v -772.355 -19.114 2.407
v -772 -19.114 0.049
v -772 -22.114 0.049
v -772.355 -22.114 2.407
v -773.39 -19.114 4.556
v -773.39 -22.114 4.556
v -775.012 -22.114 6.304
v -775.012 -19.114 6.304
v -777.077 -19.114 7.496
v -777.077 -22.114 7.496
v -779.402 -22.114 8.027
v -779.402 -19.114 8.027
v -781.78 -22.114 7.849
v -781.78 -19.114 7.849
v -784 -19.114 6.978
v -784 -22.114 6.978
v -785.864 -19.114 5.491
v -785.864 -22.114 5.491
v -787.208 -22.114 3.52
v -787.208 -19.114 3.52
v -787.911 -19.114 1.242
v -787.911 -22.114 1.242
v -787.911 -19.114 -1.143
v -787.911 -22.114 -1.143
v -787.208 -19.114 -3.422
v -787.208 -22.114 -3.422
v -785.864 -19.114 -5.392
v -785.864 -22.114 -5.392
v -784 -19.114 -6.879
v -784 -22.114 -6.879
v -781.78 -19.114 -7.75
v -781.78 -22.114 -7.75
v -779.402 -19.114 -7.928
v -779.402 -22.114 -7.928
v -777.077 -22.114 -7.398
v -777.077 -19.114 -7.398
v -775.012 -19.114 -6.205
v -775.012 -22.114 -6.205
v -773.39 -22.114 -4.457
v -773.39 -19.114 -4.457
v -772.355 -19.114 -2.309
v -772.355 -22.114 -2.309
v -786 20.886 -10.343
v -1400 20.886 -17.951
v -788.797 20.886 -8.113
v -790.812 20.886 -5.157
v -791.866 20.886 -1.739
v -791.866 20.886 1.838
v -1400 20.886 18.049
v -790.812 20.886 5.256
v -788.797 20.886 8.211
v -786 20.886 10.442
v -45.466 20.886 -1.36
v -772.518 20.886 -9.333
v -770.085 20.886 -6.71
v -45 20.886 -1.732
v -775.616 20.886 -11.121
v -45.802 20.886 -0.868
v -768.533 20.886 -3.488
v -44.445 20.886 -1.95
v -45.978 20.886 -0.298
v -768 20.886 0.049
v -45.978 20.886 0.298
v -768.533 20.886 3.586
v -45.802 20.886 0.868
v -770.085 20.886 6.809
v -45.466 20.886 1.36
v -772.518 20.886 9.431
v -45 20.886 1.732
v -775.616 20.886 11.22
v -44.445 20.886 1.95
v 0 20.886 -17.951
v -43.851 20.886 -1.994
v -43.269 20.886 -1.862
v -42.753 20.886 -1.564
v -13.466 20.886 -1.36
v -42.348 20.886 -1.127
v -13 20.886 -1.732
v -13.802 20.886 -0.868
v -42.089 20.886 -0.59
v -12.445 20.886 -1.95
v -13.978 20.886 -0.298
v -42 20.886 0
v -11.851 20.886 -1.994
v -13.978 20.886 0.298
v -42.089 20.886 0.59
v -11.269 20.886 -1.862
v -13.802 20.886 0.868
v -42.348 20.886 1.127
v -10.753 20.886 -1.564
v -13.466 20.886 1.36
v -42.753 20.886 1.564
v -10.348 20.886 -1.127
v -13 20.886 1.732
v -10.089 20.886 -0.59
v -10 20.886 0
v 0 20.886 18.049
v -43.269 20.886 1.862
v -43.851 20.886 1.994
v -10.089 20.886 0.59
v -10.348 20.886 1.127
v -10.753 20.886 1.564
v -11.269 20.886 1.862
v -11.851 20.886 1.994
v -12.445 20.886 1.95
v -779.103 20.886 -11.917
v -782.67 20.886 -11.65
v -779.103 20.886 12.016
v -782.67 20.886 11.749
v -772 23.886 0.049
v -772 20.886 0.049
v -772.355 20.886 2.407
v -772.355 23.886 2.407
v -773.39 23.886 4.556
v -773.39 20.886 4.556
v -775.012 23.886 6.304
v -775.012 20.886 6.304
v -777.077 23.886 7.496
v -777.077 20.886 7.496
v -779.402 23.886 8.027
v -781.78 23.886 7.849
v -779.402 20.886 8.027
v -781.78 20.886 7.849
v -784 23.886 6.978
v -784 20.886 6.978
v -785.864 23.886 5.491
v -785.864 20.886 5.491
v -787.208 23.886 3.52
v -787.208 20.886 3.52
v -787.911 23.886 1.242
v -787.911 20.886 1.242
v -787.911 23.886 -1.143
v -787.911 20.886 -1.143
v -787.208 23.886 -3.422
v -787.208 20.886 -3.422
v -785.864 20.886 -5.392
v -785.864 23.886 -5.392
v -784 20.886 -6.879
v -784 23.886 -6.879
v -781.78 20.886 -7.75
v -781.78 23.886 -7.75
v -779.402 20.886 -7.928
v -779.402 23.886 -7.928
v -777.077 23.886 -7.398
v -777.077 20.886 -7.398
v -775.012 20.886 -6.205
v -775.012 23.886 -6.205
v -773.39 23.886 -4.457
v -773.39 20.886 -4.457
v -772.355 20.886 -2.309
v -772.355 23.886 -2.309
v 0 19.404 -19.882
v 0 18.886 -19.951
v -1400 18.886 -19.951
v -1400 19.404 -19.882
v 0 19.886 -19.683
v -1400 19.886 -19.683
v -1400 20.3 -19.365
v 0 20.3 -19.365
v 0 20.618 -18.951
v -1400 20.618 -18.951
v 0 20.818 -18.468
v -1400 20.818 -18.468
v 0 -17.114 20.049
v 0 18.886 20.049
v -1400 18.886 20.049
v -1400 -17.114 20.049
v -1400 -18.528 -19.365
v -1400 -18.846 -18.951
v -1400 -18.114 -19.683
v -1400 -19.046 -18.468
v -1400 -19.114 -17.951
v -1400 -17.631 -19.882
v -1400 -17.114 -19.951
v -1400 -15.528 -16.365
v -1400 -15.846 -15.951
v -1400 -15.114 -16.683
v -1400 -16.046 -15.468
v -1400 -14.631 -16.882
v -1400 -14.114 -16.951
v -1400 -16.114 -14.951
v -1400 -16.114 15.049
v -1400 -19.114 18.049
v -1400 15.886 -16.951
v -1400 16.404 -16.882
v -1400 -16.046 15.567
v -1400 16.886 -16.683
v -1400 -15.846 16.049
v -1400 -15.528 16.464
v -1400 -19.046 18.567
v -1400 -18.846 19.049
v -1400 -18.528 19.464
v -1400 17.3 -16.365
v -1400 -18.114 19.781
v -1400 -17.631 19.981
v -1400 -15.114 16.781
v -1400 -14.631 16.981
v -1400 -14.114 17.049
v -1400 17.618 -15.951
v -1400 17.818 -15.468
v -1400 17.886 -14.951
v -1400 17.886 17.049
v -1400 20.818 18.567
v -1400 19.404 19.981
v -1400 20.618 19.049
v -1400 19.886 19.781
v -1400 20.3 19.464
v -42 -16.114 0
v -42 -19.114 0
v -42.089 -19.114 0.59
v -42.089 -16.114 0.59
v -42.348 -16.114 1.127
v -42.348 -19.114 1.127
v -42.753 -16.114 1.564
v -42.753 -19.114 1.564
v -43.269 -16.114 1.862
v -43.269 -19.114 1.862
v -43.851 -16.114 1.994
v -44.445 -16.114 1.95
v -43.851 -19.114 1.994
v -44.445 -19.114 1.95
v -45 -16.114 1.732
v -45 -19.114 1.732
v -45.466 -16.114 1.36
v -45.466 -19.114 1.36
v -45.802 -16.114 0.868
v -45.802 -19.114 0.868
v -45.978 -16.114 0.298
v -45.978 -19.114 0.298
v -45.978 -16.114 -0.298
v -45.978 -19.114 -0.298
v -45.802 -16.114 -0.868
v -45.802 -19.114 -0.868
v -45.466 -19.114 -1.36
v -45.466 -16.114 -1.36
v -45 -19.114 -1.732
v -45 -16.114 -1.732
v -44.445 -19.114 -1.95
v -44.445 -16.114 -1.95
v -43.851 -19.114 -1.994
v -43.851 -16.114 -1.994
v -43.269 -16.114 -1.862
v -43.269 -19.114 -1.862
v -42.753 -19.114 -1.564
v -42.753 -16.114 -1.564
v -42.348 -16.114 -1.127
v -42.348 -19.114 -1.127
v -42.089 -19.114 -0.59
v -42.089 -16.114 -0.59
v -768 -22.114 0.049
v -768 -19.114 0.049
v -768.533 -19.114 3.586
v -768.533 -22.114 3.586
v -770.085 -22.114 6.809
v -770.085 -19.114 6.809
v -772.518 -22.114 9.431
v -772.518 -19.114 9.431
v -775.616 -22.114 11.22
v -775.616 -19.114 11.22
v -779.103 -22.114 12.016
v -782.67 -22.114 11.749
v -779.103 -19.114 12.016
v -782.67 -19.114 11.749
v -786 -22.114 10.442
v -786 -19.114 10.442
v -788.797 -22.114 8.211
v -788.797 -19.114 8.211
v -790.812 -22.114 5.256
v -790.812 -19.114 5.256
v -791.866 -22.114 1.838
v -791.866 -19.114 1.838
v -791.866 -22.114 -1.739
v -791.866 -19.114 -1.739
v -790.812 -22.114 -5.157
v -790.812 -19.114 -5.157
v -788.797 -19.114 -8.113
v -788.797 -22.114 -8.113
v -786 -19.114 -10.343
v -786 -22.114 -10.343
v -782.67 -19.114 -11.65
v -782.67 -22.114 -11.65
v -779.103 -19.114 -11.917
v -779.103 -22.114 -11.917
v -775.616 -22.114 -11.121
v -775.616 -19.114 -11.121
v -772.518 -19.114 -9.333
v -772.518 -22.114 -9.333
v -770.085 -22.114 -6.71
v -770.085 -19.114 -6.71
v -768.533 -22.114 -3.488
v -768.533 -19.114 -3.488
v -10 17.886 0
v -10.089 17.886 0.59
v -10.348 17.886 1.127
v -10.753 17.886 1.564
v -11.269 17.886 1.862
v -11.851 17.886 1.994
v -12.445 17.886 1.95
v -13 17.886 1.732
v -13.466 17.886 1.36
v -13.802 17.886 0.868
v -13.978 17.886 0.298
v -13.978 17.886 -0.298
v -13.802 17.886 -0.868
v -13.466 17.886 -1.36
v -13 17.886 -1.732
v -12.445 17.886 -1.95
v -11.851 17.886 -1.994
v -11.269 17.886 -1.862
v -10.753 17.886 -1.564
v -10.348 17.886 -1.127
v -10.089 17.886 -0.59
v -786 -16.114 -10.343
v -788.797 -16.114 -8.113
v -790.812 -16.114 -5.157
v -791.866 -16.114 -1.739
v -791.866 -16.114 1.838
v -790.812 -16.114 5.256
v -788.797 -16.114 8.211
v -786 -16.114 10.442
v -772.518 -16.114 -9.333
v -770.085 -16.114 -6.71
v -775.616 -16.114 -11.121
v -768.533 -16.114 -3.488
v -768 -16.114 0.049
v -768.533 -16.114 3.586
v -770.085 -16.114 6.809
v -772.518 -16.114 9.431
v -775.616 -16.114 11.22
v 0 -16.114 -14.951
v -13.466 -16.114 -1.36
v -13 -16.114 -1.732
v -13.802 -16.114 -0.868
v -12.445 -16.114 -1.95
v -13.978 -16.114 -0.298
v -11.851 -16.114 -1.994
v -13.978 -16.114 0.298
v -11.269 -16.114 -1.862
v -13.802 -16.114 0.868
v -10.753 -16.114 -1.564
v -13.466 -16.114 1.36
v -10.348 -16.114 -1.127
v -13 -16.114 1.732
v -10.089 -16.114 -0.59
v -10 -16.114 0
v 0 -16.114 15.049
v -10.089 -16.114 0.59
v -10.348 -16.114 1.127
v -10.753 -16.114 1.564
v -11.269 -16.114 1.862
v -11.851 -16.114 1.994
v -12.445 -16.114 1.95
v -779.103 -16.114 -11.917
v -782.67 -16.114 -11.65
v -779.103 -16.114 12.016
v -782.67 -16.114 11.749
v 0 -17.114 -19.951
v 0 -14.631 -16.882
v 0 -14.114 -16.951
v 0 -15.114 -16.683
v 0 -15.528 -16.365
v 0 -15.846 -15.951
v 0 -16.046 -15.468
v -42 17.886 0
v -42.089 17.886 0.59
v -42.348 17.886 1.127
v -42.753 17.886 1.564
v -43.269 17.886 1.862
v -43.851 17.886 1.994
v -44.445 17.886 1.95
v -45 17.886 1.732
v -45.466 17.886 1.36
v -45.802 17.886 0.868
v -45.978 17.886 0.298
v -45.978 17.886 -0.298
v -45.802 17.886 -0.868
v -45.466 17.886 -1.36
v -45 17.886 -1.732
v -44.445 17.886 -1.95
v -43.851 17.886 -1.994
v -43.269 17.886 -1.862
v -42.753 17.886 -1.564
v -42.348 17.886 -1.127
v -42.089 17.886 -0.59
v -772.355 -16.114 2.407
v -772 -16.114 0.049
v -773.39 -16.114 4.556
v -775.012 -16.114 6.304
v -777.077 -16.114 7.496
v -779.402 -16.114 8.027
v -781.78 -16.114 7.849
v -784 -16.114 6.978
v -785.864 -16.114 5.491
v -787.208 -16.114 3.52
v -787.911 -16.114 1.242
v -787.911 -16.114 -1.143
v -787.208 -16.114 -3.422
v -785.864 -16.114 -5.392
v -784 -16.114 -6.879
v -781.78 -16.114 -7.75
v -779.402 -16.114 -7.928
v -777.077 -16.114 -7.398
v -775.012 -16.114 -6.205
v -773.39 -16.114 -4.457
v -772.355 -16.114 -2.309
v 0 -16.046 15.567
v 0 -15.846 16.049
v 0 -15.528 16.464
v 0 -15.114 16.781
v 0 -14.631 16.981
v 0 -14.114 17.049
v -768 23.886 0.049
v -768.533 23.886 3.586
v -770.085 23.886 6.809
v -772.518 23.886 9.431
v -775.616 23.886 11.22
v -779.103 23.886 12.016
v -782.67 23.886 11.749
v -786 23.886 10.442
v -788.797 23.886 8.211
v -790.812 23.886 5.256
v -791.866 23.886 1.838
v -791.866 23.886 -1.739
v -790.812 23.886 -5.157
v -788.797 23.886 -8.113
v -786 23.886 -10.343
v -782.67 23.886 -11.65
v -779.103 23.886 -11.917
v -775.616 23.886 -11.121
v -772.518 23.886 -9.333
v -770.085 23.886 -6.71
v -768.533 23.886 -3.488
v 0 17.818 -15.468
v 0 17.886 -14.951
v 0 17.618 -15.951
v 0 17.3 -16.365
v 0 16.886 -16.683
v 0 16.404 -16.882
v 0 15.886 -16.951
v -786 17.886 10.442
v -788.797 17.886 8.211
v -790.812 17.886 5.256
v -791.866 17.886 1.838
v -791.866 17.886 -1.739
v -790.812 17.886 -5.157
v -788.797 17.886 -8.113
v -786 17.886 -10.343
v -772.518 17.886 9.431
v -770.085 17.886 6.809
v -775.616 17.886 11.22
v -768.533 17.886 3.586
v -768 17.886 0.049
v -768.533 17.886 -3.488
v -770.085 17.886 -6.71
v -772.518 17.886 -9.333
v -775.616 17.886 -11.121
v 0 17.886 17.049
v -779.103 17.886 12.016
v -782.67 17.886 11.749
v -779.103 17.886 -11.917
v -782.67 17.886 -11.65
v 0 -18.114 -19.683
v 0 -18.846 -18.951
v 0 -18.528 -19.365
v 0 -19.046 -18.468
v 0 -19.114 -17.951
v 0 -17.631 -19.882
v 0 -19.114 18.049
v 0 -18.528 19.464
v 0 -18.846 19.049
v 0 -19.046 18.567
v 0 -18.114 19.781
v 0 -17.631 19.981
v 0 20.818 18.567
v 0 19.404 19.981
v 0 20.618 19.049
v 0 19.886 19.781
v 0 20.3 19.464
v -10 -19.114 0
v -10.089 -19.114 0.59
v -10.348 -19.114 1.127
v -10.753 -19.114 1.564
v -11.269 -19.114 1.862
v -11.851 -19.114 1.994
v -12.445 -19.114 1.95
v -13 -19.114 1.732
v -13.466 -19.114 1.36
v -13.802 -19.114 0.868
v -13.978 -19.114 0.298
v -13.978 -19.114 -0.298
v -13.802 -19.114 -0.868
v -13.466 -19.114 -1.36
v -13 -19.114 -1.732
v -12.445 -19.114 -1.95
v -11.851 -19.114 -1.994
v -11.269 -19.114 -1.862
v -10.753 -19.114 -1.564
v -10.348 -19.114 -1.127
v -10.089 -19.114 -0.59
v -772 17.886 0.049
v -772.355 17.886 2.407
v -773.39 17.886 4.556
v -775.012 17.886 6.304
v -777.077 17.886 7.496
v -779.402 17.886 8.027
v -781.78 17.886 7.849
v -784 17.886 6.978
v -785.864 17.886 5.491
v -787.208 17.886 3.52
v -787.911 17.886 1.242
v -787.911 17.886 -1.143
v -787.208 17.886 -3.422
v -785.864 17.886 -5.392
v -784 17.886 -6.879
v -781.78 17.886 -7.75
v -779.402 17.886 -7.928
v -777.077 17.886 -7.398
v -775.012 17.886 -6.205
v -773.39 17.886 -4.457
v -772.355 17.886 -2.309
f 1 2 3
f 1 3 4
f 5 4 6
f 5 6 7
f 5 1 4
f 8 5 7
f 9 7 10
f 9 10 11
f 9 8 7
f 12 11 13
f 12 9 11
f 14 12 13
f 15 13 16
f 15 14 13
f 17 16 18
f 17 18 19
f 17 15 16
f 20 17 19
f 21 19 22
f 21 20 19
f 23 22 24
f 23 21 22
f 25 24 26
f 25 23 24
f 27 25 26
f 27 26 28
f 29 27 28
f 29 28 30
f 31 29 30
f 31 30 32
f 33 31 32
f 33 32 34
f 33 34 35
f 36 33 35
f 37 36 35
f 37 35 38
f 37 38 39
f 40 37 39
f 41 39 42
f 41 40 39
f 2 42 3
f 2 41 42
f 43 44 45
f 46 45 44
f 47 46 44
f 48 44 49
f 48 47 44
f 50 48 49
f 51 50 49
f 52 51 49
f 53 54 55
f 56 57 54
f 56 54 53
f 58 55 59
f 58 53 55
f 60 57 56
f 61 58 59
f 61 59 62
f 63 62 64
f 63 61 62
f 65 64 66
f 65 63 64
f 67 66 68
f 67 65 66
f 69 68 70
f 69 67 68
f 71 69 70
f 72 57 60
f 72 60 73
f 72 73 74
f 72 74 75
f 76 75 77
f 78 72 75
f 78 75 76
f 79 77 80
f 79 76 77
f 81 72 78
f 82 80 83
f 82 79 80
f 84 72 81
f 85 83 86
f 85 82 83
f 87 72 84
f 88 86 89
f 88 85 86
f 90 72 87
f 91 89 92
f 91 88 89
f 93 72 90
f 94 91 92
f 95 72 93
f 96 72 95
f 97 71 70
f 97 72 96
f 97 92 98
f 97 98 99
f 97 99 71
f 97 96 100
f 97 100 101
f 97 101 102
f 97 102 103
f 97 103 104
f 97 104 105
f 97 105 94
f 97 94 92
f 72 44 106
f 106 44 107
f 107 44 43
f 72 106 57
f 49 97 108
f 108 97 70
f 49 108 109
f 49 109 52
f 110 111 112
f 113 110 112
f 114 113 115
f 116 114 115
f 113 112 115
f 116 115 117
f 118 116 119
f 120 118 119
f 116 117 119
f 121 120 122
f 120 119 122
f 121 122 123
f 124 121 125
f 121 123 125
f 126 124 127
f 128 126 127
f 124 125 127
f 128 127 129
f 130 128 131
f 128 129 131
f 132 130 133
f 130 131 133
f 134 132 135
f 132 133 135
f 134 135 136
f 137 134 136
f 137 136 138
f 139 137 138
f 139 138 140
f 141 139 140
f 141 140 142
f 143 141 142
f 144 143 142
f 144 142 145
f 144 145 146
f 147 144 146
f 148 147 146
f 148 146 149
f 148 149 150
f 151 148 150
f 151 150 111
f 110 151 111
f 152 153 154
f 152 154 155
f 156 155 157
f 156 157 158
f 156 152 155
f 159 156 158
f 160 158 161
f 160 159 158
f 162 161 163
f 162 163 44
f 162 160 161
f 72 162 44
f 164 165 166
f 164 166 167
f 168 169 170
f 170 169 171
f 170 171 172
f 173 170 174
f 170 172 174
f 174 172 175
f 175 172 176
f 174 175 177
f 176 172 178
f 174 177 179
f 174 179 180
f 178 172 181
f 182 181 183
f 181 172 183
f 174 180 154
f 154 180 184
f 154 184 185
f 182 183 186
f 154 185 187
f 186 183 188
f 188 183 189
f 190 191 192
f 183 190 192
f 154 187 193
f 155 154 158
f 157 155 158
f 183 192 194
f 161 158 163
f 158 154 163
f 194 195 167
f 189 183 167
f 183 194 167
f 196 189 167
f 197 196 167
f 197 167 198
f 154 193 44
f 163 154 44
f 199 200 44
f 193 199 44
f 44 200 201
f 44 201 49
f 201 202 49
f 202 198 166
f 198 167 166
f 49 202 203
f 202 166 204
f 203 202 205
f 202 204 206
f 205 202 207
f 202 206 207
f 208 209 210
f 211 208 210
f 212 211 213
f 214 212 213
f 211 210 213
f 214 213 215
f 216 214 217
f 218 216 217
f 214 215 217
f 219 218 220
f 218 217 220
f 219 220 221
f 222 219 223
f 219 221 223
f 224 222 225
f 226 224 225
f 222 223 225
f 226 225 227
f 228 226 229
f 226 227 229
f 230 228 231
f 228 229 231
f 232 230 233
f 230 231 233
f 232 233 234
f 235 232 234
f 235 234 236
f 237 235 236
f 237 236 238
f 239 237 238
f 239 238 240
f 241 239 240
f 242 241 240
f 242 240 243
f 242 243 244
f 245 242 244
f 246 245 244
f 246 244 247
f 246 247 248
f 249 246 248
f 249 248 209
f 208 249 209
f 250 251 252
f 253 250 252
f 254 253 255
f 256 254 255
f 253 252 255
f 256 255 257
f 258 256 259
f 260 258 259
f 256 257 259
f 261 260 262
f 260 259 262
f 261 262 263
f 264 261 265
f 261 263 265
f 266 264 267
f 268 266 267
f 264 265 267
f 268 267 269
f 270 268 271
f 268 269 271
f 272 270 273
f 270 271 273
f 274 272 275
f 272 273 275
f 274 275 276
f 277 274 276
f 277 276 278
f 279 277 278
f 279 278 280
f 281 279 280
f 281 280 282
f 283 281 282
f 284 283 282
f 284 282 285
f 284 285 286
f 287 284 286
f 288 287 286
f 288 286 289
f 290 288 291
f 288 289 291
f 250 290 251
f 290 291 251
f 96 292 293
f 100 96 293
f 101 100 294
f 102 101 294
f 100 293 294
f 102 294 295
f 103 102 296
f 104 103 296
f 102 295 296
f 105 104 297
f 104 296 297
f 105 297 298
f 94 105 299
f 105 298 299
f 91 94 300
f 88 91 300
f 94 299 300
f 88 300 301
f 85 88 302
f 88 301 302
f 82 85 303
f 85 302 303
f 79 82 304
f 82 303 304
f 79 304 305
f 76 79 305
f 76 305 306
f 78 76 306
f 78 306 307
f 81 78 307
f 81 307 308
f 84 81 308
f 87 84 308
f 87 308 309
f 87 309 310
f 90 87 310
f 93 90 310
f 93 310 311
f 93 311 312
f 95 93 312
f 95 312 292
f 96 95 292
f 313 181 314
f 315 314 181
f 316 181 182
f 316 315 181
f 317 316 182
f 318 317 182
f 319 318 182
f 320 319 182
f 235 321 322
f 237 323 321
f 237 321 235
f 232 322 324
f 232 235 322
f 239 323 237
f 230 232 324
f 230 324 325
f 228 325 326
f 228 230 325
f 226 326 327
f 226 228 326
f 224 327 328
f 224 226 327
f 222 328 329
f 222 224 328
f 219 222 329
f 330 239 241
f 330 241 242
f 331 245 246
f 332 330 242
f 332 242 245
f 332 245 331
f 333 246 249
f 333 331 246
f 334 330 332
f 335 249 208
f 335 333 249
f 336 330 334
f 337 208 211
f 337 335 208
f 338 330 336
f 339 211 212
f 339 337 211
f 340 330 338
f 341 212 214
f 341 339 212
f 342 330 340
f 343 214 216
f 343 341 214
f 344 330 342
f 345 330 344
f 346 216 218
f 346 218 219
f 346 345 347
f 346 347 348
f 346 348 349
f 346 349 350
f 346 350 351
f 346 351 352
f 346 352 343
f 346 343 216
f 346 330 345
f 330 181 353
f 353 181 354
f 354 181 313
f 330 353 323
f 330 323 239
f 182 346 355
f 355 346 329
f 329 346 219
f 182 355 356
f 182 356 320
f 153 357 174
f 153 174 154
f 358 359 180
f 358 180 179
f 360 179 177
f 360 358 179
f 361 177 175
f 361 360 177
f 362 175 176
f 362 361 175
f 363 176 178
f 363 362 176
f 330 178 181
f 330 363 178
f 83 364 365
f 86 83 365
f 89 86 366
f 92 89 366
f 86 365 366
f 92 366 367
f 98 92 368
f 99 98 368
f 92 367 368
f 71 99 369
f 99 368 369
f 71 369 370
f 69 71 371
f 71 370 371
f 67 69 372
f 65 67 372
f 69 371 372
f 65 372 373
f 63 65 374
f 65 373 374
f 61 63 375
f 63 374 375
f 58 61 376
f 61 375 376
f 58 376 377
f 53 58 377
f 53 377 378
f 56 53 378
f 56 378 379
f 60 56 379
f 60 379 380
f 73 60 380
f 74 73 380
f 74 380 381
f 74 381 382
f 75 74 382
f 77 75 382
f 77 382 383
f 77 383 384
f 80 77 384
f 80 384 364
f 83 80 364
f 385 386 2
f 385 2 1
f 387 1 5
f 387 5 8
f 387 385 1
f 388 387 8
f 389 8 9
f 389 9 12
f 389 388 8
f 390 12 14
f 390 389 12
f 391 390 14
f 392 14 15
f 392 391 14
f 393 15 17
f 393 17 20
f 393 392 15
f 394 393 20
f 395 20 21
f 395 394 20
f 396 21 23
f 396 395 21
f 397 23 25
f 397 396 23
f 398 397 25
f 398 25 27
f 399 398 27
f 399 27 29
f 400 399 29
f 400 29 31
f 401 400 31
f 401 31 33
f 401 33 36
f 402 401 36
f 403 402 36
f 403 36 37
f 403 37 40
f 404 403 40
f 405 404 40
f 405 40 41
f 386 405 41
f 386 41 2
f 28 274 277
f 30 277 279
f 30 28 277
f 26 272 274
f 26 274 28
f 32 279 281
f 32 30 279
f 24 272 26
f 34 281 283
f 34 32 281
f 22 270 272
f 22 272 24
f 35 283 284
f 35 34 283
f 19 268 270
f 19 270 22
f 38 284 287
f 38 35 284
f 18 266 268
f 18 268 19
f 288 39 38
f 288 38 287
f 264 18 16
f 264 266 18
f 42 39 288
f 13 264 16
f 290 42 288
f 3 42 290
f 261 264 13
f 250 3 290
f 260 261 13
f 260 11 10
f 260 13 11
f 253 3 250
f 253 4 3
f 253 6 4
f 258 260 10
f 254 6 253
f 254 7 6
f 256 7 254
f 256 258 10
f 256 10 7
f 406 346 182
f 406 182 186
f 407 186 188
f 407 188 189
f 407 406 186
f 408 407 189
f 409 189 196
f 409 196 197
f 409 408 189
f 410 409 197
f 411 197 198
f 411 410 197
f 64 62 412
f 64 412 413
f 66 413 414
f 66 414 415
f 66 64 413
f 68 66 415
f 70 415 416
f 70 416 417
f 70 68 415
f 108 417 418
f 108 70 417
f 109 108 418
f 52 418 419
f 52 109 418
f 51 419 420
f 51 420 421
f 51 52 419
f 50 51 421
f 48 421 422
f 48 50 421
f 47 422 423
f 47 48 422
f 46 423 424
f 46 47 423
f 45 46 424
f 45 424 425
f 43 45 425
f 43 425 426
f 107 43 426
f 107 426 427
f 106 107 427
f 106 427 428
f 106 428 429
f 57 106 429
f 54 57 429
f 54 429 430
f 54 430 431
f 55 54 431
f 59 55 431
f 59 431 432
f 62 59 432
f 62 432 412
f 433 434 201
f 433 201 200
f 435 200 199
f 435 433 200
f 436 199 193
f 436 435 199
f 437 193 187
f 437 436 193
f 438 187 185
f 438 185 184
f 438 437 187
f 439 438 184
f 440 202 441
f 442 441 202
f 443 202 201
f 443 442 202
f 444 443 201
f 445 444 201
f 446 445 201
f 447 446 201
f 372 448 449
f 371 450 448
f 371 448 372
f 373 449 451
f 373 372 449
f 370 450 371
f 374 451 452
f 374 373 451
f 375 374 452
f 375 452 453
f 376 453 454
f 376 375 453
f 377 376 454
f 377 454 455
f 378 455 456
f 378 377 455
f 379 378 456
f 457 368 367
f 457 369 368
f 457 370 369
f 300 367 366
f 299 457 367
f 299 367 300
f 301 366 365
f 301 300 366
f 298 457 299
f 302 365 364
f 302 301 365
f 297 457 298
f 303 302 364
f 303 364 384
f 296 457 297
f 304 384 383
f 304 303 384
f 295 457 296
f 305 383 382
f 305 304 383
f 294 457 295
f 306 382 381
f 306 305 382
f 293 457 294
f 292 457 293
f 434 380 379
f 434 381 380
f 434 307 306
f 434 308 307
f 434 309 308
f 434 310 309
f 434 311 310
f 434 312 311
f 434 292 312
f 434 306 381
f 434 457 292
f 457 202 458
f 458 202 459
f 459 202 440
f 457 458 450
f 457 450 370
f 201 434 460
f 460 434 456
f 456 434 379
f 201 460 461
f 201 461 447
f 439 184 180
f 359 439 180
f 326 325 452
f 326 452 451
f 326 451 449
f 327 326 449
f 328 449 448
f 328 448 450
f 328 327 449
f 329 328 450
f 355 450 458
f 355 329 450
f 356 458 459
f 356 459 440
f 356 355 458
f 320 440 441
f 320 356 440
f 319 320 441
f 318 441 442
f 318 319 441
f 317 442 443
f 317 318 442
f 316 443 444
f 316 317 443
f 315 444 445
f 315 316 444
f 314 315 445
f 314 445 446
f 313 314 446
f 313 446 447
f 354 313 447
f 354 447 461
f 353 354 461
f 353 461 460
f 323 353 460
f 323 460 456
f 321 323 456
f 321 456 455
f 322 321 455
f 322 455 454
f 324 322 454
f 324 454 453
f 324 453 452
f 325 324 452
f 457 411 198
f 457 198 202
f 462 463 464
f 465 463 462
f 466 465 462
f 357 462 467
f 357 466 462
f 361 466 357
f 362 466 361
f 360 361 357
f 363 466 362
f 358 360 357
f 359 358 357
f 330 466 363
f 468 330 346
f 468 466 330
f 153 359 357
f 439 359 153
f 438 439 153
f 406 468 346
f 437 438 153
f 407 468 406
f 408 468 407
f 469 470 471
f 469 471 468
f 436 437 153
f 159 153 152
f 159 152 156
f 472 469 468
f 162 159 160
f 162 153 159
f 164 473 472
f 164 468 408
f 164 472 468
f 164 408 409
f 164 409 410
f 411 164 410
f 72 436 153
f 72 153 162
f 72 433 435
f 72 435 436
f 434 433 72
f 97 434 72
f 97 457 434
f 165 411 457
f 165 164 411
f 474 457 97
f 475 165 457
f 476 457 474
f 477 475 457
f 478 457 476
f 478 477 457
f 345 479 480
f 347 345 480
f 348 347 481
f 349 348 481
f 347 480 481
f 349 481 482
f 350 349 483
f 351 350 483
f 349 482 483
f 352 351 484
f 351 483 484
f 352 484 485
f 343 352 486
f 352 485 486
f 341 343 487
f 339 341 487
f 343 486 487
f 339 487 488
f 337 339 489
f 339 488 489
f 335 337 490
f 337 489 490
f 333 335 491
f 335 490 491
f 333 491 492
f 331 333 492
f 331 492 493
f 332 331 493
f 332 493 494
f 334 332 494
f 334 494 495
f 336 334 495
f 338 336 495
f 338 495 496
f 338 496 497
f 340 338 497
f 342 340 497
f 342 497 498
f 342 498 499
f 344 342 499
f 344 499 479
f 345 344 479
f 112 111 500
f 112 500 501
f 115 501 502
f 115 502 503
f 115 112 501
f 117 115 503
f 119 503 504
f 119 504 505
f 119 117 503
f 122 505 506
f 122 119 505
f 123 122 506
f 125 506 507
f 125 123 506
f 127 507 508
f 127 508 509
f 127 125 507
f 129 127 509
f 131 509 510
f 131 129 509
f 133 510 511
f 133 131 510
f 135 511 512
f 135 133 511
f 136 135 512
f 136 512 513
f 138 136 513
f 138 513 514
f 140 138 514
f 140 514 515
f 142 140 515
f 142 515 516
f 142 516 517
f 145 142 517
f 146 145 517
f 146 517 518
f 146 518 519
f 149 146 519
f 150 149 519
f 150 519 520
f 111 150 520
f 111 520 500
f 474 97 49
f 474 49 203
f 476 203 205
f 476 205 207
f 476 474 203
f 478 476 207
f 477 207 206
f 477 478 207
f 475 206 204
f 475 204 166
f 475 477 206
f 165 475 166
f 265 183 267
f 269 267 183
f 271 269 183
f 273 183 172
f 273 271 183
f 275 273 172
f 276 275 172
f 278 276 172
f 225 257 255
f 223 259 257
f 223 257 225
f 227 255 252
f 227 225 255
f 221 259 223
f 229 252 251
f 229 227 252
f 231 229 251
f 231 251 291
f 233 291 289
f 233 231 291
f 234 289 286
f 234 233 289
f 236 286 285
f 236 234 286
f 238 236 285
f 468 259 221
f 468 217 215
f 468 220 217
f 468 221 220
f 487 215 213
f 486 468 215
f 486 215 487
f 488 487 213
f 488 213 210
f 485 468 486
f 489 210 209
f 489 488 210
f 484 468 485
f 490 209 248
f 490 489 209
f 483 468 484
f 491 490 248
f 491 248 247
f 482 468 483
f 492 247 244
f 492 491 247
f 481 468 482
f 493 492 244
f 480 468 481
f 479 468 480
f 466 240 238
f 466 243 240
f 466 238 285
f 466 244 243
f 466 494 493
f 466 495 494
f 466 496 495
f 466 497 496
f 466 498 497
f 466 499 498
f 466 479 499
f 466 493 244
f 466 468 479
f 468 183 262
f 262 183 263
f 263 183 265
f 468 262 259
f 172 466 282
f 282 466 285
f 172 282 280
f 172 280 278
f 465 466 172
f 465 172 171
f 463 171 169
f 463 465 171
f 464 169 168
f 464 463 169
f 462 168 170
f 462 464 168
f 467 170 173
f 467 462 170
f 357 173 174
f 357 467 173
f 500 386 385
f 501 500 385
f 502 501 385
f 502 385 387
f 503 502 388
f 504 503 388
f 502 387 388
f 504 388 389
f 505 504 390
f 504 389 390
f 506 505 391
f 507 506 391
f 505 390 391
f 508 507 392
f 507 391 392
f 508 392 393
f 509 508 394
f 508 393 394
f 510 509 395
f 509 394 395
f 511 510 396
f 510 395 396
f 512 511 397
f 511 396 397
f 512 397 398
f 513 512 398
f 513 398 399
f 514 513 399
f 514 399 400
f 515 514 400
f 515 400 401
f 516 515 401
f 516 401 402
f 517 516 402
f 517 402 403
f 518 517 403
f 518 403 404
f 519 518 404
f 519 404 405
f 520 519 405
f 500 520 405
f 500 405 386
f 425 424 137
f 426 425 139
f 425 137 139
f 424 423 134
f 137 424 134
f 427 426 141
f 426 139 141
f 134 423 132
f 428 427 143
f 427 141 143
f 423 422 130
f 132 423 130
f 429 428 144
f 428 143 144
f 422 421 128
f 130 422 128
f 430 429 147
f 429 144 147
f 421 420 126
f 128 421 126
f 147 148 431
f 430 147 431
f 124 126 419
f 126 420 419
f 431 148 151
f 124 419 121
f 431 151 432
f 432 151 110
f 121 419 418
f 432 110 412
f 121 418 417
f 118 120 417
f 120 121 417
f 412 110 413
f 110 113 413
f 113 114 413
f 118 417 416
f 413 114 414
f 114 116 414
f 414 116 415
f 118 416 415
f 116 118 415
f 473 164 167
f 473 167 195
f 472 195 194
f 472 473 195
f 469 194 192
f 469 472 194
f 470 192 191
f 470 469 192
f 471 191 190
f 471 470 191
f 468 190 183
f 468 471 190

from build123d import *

# Parameters (mm, degrees)
F3_DEPTH      = 1400
F4_R          = 12
F4_R_2        = 8
F5_DEPTH      = 3
F5_DEPTH_BACK = 43
F6_DEPTH      = 63
F4_R_3        = 2
F7_DEPTH      = 50000


with BuildPart() as f3:
    # F2 (on Right) → F3 (new body)
    with BuildSketch(Plane.YZ):
        with BuildLine():
            Line((18.886194054, 20.0493852866), (-17.113805946, 20.0493852866))
            ThreePointArc((-17.113805946, 20.0493852866), (-18.5280195083, 19.463598849), (-19.113805946, 18.0493852866))
            Line((-19.113805946, 18.0493852866), (-19.113805946, -17.9506147134))
            ThreePointArc((-19.113805946, -17.9506147134), (-18.5280195083, -19.3648282758), (-17.113805946, -19.9506147134))
            Line((-17.113805946, -19.9506147134), (18.886194054, -19.9506147134))
            ThreePointArc((18.886194054, -19.9506147134), (20.3004076164, -19.3648282758), (20.886194054, -17.9506147134))
            Line((20.886194054, -17.9506147134), (20.886194054, 18.0493852866))
            ThreePointArc((20.886194054, 18.0493852866), (20.3004076164, 19.463598849), (18.886194054, 20.0493852866))
        make_face()
        with BuildLine():
            Line((-16.113805946, -14.9506147134), (-16.113805946, 15.0493852866))
            ThreePointArc((-16.113805946, 15.0493852866), (-15.5280195083, 16.463598849), (-14.113805946, 17.0493852866))
            Line((-14.113805946, 17.0493852866), (17.886194054, 17.0493852866))
            Line((17.886194054, 17.0493852866), (17.886194054, -14.9506147134))
            ThreePointArc((17.886194054, -14.9506147134), (17.3004076164, -16.3648282758), (15.886194054, -16.9506147134))
            Line((15.886194054, -16.9506147134), (-14.113805946, -16.9506147134))
            ThreePointArc((-14.113805946, -16.9506147134), (-15.5280195083, -16.3648282758), (-16.113805946, -14.9506147134))
        make_face(mode=Mode.SUBTRACT)
    extrude(amount=-F3_DEPTH)

    # F4 (on face) → F5 (join, two sides)
    with BuildSketch(Plane.XZ.offset(19.113805946)) as f5_sk:
        with Locations((-780, 0.0493852866)):
            Circle(F4_R)
        with Locations((-780, 0.0493852866)):
            Circle(F4_R_2, mode=Mode.SUBTRACT)
    extrude(amount=F5_DEPTH)
    extrude(f5_sk.sketch, amount=-F5_DEPTH_BACK)

    # F6 (cut): a face of the model
    f6_faces = [f3.faces().sort_by_distance(p)[0] for p in [
        (-780, 20.886194054, 0.0493852866),
    ]]
    extrude(f6_faces, amount=-F6_DEPTH, mode=Mode.SUBTRACT)

    # F4 (on face) → F7 (cut)
    with BuildSketch(Plane.XZ.offset(19.113805946)):
        with Locations((-44, 0)):
            Circle(F4_R_3)
        with Locations((-12, 0)):
            Circle(F4_R_3)
    extrude(amount=-F7_DEPTH, mode=Mode.SUBTRACT)


solid = f3.part
